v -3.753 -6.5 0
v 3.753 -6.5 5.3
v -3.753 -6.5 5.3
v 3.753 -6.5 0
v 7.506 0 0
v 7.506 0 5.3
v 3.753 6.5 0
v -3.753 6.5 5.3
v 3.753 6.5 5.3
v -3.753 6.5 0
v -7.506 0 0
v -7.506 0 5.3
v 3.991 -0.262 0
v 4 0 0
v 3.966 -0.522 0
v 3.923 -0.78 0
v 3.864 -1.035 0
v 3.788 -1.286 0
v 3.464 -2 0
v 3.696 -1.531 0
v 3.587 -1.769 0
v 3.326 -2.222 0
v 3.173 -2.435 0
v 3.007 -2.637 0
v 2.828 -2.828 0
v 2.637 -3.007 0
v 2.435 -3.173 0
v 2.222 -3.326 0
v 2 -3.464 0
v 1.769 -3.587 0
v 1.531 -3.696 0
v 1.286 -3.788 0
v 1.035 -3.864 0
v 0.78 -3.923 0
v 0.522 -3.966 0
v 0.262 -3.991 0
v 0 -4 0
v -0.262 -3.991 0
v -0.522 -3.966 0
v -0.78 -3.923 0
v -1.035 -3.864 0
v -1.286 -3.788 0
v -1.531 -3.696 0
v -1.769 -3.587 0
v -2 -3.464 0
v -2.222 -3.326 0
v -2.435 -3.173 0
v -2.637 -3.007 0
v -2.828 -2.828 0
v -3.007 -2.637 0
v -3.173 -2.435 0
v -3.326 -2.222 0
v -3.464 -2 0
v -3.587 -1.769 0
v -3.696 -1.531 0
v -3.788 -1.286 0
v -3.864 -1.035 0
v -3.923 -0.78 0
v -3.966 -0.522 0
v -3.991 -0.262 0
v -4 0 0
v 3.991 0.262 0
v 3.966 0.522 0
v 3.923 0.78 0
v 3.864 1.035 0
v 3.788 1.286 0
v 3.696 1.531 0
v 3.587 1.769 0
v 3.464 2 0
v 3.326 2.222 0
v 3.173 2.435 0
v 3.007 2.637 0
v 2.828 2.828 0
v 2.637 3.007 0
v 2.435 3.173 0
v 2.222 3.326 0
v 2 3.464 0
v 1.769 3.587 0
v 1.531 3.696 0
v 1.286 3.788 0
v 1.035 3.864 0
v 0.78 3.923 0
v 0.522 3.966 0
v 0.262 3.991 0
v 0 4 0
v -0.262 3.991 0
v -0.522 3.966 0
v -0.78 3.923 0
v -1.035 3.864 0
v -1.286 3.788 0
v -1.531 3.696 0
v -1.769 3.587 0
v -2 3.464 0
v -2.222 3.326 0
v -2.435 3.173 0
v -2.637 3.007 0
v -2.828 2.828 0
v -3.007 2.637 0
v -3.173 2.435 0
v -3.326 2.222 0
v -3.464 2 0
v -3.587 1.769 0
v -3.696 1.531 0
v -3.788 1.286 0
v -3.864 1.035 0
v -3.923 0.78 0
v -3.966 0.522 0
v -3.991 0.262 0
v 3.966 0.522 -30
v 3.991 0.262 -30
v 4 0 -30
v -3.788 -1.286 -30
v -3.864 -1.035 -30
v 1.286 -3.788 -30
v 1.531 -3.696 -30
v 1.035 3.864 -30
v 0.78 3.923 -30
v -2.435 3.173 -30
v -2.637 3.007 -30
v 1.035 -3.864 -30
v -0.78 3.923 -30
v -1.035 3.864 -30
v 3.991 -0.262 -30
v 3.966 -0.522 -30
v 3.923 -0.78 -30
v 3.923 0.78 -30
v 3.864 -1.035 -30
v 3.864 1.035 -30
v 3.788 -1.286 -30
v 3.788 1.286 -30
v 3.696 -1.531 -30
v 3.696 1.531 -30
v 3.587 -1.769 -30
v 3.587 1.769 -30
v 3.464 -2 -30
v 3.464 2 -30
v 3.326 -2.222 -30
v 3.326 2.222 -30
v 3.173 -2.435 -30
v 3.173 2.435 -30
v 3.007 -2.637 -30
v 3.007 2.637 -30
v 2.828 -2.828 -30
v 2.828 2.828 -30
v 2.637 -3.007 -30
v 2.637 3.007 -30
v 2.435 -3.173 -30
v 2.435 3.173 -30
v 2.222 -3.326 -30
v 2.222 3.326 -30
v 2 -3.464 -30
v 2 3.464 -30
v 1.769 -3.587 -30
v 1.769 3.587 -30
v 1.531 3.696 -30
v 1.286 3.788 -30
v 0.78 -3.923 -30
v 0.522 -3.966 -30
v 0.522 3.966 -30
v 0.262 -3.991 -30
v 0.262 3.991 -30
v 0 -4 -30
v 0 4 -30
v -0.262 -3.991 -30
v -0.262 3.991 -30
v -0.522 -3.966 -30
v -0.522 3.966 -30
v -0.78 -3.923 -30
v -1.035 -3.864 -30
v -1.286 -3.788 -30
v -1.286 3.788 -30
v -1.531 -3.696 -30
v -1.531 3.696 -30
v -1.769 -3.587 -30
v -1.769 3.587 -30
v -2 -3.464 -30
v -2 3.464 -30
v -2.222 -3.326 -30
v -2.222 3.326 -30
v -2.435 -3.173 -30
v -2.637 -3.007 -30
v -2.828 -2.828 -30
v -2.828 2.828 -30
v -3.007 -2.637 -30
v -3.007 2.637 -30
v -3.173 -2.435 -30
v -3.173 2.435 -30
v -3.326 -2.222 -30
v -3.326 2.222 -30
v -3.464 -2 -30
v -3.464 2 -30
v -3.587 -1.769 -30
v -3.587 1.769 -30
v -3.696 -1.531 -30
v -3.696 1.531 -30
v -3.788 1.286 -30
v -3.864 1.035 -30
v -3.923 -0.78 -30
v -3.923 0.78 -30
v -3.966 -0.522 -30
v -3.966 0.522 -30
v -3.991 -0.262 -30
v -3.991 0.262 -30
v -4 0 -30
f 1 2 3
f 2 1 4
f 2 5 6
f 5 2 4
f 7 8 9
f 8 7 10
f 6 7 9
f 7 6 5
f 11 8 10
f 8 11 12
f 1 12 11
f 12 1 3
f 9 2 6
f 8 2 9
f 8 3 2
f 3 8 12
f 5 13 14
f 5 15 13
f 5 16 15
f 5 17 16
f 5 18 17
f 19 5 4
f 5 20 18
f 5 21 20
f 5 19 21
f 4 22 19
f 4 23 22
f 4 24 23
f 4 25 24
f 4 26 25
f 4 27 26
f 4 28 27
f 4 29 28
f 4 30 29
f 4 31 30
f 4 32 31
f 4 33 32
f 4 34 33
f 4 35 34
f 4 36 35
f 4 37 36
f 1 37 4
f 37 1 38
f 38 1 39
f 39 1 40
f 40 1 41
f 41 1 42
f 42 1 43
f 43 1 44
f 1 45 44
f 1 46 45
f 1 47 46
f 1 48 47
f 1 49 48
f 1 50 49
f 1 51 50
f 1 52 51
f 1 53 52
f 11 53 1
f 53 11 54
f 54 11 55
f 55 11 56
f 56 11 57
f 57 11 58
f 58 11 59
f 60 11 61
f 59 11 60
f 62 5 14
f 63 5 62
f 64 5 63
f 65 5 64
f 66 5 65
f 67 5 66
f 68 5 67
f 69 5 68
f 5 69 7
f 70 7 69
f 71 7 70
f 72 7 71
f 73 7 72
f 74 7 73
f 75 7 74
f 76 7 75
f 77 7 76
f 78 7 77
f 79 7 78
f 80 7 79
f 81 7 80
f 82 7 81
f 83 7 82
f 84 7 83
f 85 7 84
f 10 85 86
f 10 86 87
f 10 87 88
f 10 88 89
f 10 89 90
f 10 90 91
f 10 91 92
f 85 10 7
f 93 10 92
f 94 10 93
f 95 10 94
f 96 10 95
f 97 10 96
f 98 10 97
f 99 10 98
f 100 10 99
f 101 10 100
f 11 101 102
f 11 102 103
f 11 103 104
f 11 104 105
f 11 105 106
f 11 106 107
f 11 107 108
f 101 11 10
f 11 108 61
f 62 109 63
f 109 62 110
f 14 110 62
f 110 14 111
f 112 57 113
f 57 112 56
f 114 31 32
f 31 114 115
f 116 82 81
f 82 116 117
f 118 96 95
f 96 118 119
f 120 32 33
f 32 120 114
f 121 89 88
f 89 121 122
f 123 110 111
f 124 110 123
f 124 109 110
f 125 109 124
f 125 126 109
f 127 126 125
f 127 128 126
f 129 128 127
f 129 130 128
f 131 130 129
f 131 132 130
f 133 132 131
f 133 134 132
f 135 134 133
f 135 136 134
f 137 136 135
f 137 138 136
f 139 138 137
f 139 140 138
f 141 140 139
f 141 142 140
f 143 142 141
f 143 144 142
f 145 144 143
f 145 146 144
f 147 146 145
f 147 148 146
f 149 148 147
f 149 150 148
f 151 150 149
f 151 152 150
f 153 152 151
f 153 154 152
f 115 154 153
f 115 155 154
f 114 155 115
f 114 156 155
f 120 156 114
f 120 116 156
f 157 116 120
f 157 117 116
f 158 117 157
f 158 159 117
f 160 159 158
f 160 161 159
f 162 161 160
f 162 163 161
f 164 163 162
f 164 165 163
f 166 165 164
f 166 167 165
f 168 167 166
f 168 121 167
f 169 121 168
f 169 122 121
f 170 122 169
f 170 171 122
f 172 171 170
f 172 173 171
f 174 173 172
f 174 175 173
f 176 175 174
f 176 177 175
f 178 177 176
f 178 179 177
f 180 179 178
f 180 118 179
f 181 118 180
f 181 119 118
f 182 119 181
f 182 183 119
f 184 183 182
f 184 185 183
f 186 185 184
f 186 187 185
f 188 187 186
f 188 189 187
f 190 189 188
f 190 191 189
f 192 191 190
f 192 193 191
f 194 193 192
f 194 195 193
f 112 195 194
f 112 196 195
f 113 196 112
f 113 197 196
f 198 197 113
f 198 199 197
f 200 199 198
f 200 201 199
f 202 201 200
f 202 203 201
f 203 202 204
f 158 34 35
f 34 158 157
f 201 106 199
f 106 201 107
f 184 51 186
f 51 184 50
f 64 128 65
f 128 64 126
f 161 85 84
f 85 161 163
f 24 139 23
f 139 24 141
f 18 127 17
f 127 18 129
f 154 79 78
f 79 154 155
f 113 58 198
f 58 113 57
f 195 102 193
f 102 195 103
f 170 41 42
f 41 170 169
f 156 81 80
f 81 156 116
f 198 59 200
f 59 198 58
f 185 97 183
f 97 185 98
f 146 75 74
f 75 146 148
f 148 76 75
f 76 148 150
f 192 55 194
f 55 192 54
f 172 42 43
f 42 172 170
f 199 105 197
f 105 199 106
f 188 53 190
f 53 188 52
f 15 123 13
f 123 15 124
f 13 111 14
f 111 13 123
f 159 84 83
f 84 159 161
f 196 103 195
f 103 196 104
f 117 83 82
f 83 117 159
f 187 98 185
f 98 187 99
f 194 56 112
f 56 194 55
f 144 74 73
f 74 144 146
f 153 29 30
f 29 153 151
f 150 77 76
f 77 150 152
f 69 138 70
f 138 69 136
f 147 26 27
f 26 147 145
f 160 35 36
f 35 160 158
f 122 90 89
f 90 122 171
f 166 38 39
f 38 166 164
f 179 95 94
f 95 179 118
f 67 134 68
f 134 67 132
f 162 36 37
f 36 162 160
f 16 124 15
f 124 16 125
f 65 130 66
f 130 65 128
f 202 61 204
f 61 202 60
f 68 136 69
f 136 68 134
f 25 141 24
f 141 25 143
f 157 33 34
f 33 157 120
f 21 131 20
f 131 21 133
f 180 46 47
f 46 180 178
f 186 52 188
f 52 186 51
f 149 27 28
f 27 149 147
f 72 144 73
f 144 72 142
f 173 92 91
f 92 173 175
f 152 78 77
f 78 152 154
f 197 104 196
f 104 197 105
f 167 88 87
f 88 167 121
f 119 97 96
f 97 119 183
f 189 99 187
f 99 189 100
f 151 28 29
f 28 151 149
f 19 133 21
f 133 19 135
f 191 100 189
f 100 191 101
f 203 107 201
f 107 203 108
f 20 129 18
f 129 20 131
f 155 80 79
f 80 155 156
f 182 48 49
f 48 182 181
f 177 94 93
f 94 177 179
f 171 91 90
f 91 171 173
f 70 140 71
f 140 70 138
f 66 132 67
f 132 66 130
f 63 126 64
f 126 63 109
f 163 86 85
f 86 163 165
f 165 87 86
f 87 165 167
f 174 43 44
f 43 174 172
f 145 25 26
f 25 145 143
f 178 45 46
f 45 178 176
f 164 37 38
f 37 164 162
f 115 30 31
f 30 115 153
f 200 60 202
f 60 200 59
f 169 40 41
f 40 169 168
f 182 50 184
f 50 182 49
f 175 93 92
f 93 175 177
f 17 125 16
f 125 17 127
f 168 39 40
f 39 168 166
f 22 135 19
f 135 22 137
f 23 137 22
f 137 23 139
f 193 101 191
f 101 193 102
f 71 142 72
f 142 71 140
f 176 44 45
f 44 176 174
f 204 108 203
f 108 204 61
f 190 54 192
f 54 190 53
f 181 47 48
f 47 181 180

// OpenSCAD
across_flats = 13;
head_height = 5.3;
shank_diameter = 8;
shank_length = 30;

union() {
    cylinder(
        h = head_height,
        r = across_flats / sqrt(3),
        center = false,
        $fn = 6
    );

    translate([0, 0, -shank_length])
        cylinder(
            h = shank_length,
            d = shank_diameter,
            center = false,
            $fn = 96
        );
}
